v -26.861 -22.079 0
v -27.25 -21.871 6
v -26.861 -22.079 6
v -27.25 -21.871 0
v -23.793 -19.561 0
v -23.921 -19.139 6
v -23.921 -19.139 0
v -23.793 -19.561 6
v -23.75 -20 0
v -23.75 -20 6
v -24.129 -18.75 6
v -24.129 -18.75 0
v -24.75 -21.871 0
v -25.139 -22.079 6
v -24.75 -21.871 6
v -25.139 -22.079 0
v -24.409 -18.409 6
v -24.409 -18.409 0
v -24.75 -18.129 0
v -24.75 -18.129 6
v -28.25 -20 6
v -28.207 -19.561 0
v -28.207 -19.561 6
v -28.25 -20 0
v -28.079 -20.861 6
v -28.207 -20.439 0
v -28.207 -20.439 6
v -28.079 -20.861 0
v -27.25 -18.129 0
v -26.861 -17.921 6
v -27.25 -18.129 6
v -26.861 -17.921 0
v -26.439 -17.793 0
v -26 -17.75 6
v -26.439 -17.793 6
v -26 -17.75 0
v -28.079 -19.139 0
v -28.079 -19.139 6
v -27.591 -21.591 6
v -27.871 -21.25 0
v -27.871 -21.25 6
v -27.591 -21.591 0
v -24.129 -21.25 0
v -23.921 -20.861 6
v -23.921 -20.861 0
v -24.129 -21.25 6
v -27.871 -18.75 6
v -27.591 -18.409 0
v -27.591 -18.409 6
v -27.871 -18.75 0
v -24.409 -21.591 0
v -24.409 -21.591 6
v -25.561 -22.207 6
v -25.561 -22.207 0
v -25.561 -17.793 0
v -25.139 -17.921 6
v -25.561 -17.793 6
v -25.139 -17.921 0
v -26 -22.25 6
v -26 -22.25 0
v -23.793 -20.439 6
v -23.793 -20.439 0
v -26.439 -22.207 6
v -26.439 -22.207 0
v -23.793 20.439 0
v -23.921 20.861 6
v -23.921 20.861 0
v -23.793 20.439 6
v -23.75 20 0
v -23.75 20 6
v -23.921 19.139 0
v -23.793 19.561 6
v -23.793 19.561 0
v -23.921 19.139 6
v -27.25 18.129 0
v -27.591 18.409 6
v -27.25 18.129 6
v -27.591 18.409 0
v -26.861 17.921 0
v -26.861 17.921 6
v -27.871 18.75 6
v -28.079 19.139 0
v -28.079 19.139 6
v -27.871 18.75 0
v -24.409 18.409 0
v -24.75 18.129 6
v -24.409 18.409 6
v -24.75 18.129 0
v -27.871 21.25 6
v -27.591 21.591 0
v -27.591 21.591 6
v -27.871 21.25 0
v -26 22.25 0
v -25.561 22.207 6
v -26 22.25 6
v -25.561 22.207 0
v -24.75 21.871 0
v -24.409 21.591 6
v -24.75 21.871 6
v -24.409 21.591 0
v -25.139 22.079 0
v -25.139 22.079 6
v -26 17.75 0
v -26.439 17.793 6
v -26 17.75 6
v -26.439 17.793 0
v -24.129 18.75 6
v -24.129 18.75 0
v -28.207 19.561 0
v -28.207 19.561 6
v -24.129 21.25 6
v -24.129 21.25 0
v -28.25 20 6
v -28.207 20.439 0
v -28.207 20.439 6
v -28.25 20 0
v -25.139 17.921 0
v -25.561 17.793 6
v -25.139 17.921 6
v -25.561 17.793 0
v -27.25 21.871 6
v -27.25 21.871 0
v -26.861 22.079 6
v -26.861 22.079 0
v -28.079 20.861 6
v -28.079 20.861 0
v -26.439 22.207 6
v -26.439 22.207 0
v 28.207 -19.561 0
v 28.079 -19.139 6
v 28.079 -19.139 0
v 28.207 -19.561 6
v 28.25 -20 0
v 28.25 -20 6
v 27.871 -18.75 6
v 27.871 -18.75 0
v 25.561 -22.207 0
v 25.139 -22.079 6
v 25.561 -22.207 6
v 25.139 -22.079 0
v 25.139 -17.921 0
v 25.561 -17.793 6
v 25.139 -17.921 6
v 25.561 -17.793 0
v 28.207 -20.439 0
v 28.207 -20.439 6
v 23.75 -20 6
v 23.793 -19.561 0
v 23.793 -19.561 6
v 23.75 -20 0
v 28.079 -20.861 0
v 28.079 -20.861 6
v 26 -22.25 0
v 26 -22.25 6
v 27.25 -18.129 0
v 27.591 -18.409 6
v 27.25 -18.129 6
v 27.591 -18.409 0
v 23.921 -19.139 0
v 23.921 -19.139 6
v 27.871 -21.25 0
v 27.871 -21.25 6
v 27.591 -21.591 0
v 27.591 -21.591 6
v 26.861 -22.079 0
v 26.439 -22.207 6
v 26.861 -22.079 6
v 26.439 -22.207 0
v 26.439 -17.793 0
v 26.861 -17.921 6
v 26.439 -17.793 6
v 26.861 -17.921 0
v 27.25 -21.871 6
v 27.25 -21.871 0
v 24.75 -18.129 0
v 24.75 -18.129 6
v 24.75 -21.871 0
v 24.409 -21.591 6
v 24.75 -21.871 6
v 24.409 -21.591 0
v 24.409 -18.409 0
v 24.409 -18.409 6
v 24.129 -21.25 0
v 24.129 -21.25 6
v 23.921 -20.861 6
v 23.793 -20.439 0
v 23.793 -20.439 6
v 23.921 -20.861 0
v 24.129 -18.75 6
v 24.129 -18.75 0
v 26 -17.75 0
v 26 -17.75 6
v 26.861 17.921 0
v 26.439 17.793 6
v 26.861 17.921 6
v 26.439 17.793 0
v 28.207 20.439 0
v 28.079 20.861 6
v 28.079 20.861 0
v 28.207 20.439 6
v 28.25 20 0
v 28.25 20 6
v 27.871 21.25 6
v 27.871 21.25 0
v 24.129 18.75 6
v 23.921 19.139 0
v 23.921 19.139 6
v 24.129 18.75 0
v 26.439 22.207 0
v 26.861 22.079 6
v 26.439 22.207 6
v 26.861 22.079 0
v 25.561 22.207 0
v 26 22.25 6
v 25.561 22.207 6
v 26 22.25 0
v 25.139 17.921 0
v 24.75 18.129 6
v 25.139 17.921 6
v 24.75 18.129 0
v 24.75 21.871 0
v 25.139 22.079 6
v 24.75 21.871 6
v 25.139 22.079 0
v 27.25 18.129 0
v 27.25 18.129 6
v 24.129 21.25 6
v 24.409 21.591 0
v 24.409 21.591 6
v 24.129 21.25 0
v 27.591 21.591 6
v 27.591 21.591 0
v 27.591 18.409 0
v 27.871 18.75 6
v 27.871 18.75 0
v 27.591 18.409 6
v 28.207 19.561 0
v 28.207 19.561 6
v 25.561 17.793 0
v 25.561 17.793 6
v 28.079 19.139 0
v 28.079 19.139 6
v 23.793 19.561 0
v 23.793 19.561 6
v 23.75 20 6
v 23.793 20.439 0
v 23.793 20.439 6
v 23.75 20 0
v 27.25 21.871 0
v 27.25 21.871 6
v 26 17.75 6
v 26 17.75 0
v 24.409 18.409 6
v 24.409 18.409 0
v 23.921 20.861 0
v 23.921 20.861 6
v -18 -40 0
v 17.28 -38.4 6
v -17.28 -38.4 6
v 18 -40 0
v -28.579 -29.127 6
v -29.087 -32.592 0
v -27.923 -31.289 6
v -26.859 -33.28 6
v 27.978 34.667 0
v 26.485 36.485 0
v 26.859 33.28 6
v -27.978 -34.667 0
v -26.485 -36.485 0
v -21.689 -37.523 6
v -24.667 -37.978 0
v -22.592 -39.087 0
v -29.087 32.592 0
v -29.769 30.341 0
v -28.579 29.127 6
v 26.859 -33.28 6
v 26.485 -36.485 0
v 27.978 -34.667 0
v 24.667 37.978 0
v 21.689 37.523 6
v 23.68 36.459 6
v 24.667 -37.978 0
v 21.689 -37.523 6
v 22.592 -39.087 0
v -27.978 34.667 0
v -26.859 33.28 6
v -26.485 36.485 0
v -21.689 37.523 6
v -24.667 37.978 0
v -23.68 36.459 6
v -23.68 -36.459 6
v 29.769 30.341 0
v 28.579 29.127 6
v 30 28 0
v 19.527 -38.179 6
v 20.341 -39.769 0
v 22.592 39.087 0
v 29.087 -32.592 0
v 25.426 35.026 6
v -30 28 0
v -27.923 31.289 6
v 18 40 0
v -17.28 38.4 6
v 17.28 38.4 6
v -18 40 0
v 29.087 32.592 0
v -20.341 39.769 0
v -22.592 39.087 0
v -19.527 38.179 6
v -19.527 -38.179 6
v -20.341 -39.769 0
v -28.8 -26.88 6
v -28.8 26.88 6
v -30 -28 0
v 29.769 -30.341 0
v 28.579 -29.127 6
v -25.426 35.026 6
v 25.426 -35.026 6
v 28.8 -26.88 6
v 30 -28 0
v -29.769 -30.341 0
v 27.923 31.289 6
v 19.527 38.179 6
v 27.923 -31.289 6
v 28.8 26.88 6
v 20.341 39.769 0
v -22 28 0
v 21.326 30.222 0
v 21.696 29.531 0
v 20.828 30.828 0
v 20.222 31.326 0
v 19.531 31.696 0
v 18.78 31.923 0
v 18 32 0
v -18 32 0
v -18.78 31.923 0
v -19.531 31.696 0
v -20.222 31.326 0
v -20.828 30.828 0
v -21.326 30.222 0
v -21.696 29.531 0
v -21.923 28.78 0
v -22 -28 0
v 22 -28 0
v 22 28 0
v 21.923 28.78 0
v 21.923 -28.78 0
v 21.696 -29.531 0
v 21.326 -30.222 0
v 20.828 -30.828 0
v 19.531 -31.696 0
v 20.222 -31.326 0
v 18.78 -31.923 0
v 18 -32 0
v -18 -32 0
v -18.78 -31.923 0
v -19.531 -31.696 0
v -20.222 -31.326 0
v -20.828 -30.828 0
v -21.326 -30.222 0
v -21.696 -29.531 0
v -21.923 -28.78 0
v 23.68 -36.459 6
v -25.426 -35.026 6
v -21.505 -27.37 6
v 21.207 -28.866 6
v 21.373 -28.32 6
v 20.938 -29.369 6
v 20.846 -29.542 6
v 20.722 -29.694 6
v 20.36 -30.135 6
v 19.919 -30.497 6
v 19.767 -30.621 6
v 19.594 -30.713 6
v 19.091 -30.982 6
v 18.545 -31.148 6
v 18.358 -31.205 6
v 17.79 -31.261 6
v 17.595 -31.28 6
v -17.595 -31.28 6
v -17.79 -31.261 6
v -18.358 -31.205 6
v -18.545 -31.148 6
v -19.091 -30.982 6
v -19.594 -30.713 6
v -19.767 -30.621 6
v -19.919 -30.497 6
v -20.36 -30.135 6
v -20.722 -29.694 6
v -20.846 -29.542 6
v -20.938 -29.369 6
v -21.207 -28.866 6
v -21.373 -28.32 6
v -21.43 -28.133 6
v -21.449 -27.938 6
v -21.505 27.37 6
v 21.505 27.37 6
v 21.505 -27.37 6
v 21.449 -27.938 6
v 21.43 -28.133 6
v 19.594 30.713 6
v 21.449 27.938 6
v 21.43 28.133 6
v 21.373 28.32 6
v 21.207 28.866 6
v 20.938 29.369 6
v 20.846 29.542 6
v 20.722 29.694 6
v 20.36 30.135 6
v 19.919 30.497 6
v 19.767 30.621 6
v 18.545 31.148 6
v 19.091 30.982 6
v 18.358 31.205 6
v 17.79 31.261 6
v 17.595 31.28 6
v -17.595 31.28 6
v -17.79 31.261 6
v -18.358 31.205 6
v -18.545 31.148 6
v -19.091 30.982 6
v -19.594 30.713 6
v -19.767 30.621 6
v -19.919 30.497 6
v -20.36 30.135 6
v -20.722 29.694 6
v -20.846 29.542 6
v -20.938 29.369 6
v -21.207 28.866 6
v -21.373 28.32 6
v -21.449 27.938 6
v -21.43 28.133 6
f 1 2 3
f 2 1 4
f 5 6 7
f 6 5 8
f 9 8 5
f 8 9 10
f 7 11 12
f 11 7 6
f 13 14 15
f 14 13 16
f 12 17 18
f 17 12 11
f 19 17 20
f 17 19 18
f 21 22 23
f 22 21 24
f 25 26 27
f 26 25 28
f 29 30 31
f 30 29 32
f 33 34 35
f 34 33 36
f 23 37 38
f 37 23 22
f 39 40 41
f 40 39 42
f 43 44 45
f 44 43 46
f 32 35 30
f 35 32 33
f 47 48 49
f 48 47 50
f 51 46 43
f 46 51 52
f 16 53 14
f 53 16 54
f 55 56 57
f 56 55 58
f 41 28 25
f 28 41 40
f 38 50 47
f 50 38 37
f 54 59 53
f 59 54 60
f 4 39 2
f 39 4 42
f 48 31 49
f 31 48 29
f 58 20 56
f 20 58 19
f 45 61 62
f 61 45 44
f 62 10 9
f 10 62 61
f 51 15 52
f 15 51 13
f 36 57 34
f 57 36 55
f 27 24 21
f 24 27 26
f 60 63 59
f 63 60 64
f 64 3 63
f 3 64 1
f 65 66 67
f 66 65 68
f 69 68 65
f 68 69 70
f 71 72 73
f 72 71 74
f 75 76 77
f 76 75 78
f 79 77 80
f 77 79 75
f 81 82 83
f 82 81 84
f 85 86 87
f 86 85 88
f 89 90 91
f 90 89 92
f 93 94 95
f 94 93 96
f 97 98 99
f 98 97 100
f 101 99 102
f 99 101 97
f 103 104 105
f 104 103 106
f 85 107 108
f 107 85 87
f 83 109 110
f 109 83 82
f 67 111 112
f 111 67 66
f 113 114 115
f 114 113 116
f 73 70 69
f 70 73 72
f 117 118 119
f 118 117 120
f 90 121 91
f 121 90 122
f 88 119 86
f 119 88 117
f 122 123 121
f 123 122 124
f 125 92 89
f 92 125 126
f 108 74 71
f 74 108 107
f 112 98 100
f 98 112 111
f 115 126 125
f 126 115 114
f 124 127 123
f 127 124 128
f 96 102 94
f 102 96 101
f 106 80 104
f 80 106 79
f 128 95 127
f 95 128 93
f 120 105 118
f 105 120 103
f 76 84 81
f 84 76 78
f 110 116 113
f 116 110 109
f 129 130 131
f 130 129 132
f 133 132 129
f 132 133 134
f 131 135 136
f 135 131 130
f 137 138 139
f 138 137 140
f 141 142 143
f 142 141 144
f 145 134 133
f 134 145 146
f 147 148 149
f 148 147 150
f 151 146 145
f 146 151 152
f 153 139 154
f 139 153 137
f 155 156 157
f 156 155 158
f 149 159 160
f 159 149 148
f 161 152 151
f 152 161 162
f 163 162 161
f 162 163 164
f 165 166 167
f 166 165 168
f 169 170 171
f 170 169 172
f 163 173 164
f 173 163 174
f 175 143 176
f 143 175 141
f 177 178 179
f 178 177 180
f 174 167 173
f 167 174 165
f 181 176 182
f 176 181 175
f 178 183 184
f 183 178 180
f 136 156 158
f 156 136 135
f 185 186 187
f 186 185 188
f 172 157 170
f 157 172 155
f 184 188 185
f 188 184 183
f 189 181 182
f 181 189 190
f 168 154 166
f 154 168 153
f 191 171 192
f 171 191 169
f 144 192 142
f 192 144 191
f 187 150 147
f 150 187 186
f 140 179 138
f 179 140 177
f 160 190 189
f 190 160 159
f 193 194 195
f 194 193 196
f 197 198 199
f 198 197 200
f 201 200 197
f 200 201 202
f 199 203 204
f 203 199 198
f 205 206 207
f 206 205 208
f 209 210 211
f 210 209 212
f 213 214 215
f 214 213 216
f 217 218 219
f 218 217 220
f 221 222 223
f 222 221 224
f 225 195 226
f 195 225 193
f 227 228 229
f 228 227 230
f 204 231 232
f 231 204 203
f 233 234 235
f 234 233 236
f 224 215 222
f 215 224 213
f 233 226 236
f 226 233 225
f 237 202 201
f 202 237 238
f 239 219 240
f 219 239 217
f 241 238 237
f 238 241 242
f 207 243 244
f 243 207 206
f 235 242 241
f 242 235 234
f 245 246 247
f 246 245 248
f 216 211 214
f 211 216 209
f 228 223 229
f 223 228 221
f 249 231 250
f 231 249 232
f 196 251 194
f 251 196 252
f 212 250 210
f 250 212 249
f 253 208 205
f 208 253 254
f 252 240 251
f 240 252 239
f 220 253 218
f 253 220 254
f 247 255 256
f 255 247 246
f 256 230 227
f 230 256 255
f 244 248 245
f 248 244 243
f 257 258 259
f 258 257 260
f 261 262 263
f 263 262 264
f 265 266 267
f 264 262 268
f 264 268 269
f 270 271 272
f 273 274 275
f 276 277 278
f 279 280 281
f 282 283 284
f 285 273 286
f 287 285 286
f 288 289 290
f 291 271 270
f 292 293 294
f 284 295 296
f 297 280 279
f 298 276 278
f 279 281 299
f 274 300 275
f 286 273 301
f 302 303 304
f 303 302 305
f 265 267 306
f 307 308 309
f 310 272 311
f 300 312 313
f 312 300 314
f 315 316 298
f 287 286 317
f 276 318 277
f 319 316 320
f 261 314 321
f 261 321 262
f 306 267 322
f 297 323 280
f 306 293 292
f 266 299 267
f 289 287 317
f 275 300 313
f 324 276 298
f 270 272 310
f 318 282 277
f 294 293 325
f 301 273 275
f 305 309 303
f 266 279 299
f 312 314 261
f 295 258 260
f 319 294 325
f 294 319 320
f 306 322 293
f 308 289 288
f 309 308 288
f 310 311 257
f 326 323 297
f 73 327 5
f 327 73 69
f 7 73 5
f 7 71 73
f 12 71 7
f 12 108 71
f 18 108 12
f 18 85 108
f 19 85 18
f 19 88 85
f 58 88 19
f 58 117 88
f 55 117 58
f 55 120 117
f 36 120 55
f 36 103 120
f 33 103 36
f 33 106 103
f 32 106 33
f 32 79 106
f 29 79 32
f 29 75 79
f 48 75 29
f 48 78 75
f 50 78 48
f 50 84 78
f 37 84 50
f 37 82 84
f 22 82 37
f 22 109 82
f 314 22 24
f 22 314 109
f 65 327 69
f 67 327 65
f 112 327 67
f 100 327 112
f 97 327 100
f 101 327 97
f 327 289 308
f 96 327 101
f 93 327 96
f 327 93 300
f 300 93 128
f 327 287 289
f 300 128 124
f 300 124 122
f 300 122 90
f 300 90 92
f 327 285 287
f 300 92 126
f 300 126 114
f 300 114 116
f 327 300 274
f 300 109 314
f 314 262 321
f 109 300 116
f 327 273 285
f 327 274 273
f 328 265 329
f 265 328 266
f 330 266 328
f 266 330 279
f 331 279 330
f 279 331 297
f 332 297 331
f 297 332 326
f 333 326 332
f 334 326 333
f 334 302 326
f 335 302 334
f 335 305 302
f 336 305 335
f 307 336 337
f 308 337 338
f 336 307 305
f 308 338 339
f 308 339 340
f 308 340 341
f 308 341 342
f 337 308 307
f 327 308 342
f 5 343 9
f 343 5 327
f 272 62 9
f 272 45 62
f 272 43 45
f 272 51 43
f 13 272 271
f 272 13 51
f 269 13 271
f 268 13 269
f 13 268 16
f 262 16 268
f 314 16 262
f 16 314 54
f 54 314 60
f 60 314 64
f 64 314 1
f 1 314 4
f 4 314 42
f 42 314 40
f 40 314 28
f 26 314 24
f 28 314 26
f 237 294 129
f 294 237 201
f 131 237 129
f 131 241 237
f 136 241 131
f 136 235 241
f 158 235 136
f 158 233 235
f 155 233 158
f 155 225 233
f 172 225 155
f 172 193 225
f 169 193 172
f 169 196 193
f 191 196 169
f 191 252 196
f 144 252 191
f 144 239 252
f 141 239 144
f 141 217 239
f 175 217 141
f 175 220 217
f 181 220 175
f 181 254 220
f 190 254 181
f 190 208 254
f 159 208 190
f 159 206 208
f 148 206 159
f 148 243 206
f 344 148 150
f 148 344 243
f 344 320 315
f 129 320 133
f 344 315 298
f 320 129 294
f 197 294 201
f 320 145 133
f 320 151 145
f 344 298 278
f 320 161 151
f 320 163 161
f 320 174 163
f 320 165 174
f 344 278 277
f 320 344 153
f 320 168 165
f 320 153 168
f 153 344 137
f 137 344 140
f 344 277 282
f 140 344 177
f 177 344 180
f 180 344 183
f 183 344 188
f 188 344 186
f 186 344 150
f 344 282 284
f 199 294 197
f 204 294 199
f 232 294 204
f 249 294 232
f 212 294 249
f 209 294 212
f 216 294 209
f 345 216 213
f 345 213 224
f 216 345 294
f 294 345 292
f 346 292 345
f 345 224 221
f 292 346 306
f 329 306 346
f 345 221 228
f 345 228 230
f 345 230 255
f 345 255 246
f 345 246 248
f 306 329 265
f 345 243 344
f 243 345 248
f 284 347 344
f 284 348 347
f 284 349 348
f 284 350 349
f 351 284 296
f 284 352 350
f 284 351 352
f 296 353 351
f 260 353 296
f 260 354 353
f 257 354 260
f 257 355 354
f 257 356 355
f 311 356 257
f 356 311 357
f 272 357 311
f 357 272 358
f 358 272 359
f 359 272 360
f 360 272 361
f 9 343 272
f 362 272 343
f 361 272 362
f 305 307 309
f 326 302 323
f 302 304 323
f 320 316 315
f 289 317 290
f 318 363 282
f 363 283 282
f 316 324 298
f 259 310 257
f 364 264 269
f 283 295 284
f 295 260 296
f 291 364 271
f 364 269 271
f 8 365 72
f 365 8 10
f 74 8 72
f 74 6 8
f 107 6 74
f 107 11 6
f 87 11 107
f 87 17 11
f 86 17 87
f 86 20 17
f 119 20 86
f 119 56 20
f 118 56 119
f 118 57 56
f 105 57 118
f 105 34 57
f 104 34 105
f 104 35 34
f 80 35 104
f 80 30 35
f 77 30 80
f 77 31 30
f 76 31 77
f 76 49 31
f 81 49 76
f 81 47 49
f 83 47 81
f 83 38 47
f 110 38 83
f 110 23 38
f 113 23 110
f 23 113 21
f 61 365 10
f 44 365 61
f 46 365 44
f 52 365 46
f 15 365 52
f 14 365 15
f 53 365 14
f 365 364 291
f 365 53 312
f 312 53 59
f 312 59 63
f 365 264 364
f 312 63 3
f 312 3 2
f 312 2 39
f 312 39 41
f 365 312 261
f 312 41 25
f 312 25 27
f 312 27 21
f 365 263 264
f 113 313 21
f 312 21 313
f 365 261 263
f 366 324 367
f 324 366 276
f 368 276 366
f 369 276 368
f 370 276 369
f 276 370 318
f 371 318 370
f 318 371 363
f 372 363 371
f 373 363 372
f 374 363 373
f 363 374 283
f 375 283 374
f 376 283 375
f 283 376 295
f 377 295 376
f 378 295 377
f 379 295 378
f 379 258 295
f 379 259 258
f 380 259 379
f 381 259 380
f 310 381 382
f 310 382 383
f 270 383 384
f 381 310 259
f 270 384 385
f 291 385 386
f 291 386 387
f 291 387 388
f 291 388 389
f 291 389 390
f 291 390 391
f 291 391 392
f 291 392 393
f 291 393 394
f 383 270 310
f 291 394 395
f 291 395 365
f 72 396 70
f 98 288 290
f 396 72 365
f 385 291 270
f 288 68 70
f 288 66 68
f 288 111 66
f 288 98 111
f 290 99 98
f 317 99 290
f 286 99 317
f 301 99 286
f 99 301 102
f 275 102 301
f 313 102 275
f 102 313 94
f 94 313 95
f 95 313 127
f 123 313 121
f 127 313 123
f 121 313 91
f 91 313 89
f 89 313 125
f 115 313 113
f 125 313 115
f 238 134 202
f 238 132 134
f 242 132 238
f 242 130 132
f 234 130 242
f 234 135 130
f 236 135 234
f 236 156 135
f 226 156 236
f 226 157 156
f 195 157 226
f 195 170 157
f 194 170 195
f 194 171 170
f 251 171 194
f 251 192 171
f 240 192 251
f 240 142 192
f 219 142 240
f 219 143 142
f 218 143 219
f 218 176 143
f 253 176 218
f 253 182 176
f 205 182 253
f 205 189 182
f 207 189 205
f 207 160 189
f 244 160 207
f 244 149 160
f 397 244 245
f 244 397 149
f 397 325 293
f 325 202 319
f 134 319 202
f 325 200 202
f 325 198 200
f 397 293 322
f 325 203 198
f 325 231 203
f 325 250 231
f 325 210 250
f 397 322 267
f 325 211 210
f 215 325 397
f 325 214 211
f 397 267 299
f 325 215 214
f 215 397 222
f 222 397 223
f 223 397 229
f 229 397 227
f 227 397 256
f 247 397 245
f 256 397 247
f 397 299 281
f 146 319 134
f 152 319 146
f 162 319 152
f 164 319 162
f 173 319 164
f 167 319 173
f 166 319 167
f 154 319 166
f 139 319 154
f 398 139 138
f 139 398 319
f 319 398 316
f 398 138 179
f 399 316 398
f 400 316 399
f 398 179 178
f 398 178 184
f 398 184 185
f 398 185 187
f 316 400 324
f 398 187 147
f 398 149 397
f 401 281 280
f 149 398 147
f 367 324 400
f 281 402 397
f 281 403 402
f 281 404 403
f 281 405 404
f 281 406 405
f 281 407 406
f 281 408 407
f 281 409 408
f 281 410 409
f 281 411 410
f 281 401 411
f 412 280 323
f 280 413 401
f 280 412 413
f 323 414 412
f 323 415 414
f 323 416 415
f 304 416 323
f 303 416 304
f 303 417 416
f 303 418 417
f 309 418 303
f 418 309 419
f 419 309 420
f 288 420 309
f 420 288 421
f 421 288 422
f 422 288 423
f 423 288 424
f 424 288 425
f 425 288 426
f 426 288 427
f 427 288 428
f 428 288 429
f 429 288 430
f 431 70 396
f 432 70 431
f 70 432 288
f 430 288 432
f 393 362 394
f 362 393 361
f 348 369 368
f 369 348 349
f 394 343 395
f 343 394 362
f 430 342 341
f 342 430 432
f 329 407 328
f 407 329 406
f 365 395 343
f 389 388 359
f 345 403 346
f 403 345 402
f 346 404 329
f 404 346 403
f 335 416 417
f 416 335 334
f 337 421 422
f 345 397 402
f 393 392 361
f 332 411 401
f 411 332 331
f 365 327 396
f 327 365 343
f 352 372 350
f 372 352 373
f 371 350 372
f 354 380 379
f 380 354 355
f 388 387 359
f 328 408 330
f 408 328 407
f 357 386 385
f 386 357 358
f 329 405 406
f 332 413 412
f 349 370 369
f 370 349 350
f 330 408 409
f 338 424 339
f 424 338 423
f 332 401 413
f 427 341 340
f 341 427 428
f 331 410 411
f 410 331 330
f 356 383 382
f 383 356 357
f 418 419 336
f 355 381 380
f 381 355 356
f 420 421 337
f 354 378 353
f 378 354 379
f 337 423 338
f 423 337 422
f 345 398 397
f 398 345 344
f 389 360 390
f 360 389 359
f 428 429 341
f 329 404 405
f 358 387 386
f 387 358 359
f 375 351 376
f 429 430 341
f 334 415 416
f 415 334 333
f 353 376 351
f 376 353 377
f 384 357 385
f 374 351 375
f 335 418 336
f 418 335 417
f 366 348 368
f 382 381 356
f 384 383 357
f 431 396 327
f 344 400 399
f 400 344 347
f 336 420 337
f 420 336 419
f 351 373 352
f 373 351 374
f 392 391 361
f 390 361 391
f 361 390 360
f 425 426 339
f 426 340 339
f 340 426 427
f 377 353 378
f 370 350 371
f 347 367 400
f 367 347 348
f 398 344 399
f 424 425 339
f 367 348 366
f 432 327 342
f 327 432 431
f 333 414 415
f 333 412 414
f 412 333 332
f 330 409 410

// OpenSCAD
$fn = 32;

// ----------------------------------------------------------------------
// Display bezel: 60 x 80 mm frame, opening 44x64 mm
// ----------------------------------------------------------------------

// --- parameters (mm) ---
length = 60;              // frame outside length, X
width = 80;               // frame outside width, Y
frame_w = 8;              // frame width
thickness = 6;            // frame thickness
corner_r = 12;            // outside corner radius
chamfer = 0.96;           // outer wall taper
funnel = 0.97;            // inner opening taper
opening_l = 44;           // opening length
opening_w = 64;           // opening width
inner_r = 4;              // opening corner radius
hole_d = 4.5;             // mounting screw clearance
holes_per_side = 2;       // holes per short side
hole_inset = 4;           // hole centre inset from the outside edge

/* rounded-rectangle outlines, generated with loops */
module rounded_ring(l_nom, w_nom, r) {
  hull() {
    for (sx = [-1, 1]) for (sy = [-1, 1])
      translate([sx * (l_nom / 2 - r), sy * (w_nom / 2 - r)]) circle(r = r);
  }
}

difference() {
  /* frame body, drafted so the outer edge is a variable-depth chamfer */
  linear_extrude(height = thickness, scale = chamfer)
    rounded_ring(length, width, corner_r);
  /* viewing opening, drafted the other way for a funnel edge */
  linear_extrude(height = thickness + 2, scale = funnel)
    translate([0, 0, -1]) rounded_ring(opening_l, opening_w, inner_r);
  /* mounting screws through the frame lands */
  for (sx = [-1, 1]) for (i = [1 : holes_per_side])
    translate([sx * (length / 2 - hole_inset),
               (i - (holes_per_side + 1) / 2) * width * 0.5, -1])
      cylinder(h = thickness + 2, d = hole_d);
}
